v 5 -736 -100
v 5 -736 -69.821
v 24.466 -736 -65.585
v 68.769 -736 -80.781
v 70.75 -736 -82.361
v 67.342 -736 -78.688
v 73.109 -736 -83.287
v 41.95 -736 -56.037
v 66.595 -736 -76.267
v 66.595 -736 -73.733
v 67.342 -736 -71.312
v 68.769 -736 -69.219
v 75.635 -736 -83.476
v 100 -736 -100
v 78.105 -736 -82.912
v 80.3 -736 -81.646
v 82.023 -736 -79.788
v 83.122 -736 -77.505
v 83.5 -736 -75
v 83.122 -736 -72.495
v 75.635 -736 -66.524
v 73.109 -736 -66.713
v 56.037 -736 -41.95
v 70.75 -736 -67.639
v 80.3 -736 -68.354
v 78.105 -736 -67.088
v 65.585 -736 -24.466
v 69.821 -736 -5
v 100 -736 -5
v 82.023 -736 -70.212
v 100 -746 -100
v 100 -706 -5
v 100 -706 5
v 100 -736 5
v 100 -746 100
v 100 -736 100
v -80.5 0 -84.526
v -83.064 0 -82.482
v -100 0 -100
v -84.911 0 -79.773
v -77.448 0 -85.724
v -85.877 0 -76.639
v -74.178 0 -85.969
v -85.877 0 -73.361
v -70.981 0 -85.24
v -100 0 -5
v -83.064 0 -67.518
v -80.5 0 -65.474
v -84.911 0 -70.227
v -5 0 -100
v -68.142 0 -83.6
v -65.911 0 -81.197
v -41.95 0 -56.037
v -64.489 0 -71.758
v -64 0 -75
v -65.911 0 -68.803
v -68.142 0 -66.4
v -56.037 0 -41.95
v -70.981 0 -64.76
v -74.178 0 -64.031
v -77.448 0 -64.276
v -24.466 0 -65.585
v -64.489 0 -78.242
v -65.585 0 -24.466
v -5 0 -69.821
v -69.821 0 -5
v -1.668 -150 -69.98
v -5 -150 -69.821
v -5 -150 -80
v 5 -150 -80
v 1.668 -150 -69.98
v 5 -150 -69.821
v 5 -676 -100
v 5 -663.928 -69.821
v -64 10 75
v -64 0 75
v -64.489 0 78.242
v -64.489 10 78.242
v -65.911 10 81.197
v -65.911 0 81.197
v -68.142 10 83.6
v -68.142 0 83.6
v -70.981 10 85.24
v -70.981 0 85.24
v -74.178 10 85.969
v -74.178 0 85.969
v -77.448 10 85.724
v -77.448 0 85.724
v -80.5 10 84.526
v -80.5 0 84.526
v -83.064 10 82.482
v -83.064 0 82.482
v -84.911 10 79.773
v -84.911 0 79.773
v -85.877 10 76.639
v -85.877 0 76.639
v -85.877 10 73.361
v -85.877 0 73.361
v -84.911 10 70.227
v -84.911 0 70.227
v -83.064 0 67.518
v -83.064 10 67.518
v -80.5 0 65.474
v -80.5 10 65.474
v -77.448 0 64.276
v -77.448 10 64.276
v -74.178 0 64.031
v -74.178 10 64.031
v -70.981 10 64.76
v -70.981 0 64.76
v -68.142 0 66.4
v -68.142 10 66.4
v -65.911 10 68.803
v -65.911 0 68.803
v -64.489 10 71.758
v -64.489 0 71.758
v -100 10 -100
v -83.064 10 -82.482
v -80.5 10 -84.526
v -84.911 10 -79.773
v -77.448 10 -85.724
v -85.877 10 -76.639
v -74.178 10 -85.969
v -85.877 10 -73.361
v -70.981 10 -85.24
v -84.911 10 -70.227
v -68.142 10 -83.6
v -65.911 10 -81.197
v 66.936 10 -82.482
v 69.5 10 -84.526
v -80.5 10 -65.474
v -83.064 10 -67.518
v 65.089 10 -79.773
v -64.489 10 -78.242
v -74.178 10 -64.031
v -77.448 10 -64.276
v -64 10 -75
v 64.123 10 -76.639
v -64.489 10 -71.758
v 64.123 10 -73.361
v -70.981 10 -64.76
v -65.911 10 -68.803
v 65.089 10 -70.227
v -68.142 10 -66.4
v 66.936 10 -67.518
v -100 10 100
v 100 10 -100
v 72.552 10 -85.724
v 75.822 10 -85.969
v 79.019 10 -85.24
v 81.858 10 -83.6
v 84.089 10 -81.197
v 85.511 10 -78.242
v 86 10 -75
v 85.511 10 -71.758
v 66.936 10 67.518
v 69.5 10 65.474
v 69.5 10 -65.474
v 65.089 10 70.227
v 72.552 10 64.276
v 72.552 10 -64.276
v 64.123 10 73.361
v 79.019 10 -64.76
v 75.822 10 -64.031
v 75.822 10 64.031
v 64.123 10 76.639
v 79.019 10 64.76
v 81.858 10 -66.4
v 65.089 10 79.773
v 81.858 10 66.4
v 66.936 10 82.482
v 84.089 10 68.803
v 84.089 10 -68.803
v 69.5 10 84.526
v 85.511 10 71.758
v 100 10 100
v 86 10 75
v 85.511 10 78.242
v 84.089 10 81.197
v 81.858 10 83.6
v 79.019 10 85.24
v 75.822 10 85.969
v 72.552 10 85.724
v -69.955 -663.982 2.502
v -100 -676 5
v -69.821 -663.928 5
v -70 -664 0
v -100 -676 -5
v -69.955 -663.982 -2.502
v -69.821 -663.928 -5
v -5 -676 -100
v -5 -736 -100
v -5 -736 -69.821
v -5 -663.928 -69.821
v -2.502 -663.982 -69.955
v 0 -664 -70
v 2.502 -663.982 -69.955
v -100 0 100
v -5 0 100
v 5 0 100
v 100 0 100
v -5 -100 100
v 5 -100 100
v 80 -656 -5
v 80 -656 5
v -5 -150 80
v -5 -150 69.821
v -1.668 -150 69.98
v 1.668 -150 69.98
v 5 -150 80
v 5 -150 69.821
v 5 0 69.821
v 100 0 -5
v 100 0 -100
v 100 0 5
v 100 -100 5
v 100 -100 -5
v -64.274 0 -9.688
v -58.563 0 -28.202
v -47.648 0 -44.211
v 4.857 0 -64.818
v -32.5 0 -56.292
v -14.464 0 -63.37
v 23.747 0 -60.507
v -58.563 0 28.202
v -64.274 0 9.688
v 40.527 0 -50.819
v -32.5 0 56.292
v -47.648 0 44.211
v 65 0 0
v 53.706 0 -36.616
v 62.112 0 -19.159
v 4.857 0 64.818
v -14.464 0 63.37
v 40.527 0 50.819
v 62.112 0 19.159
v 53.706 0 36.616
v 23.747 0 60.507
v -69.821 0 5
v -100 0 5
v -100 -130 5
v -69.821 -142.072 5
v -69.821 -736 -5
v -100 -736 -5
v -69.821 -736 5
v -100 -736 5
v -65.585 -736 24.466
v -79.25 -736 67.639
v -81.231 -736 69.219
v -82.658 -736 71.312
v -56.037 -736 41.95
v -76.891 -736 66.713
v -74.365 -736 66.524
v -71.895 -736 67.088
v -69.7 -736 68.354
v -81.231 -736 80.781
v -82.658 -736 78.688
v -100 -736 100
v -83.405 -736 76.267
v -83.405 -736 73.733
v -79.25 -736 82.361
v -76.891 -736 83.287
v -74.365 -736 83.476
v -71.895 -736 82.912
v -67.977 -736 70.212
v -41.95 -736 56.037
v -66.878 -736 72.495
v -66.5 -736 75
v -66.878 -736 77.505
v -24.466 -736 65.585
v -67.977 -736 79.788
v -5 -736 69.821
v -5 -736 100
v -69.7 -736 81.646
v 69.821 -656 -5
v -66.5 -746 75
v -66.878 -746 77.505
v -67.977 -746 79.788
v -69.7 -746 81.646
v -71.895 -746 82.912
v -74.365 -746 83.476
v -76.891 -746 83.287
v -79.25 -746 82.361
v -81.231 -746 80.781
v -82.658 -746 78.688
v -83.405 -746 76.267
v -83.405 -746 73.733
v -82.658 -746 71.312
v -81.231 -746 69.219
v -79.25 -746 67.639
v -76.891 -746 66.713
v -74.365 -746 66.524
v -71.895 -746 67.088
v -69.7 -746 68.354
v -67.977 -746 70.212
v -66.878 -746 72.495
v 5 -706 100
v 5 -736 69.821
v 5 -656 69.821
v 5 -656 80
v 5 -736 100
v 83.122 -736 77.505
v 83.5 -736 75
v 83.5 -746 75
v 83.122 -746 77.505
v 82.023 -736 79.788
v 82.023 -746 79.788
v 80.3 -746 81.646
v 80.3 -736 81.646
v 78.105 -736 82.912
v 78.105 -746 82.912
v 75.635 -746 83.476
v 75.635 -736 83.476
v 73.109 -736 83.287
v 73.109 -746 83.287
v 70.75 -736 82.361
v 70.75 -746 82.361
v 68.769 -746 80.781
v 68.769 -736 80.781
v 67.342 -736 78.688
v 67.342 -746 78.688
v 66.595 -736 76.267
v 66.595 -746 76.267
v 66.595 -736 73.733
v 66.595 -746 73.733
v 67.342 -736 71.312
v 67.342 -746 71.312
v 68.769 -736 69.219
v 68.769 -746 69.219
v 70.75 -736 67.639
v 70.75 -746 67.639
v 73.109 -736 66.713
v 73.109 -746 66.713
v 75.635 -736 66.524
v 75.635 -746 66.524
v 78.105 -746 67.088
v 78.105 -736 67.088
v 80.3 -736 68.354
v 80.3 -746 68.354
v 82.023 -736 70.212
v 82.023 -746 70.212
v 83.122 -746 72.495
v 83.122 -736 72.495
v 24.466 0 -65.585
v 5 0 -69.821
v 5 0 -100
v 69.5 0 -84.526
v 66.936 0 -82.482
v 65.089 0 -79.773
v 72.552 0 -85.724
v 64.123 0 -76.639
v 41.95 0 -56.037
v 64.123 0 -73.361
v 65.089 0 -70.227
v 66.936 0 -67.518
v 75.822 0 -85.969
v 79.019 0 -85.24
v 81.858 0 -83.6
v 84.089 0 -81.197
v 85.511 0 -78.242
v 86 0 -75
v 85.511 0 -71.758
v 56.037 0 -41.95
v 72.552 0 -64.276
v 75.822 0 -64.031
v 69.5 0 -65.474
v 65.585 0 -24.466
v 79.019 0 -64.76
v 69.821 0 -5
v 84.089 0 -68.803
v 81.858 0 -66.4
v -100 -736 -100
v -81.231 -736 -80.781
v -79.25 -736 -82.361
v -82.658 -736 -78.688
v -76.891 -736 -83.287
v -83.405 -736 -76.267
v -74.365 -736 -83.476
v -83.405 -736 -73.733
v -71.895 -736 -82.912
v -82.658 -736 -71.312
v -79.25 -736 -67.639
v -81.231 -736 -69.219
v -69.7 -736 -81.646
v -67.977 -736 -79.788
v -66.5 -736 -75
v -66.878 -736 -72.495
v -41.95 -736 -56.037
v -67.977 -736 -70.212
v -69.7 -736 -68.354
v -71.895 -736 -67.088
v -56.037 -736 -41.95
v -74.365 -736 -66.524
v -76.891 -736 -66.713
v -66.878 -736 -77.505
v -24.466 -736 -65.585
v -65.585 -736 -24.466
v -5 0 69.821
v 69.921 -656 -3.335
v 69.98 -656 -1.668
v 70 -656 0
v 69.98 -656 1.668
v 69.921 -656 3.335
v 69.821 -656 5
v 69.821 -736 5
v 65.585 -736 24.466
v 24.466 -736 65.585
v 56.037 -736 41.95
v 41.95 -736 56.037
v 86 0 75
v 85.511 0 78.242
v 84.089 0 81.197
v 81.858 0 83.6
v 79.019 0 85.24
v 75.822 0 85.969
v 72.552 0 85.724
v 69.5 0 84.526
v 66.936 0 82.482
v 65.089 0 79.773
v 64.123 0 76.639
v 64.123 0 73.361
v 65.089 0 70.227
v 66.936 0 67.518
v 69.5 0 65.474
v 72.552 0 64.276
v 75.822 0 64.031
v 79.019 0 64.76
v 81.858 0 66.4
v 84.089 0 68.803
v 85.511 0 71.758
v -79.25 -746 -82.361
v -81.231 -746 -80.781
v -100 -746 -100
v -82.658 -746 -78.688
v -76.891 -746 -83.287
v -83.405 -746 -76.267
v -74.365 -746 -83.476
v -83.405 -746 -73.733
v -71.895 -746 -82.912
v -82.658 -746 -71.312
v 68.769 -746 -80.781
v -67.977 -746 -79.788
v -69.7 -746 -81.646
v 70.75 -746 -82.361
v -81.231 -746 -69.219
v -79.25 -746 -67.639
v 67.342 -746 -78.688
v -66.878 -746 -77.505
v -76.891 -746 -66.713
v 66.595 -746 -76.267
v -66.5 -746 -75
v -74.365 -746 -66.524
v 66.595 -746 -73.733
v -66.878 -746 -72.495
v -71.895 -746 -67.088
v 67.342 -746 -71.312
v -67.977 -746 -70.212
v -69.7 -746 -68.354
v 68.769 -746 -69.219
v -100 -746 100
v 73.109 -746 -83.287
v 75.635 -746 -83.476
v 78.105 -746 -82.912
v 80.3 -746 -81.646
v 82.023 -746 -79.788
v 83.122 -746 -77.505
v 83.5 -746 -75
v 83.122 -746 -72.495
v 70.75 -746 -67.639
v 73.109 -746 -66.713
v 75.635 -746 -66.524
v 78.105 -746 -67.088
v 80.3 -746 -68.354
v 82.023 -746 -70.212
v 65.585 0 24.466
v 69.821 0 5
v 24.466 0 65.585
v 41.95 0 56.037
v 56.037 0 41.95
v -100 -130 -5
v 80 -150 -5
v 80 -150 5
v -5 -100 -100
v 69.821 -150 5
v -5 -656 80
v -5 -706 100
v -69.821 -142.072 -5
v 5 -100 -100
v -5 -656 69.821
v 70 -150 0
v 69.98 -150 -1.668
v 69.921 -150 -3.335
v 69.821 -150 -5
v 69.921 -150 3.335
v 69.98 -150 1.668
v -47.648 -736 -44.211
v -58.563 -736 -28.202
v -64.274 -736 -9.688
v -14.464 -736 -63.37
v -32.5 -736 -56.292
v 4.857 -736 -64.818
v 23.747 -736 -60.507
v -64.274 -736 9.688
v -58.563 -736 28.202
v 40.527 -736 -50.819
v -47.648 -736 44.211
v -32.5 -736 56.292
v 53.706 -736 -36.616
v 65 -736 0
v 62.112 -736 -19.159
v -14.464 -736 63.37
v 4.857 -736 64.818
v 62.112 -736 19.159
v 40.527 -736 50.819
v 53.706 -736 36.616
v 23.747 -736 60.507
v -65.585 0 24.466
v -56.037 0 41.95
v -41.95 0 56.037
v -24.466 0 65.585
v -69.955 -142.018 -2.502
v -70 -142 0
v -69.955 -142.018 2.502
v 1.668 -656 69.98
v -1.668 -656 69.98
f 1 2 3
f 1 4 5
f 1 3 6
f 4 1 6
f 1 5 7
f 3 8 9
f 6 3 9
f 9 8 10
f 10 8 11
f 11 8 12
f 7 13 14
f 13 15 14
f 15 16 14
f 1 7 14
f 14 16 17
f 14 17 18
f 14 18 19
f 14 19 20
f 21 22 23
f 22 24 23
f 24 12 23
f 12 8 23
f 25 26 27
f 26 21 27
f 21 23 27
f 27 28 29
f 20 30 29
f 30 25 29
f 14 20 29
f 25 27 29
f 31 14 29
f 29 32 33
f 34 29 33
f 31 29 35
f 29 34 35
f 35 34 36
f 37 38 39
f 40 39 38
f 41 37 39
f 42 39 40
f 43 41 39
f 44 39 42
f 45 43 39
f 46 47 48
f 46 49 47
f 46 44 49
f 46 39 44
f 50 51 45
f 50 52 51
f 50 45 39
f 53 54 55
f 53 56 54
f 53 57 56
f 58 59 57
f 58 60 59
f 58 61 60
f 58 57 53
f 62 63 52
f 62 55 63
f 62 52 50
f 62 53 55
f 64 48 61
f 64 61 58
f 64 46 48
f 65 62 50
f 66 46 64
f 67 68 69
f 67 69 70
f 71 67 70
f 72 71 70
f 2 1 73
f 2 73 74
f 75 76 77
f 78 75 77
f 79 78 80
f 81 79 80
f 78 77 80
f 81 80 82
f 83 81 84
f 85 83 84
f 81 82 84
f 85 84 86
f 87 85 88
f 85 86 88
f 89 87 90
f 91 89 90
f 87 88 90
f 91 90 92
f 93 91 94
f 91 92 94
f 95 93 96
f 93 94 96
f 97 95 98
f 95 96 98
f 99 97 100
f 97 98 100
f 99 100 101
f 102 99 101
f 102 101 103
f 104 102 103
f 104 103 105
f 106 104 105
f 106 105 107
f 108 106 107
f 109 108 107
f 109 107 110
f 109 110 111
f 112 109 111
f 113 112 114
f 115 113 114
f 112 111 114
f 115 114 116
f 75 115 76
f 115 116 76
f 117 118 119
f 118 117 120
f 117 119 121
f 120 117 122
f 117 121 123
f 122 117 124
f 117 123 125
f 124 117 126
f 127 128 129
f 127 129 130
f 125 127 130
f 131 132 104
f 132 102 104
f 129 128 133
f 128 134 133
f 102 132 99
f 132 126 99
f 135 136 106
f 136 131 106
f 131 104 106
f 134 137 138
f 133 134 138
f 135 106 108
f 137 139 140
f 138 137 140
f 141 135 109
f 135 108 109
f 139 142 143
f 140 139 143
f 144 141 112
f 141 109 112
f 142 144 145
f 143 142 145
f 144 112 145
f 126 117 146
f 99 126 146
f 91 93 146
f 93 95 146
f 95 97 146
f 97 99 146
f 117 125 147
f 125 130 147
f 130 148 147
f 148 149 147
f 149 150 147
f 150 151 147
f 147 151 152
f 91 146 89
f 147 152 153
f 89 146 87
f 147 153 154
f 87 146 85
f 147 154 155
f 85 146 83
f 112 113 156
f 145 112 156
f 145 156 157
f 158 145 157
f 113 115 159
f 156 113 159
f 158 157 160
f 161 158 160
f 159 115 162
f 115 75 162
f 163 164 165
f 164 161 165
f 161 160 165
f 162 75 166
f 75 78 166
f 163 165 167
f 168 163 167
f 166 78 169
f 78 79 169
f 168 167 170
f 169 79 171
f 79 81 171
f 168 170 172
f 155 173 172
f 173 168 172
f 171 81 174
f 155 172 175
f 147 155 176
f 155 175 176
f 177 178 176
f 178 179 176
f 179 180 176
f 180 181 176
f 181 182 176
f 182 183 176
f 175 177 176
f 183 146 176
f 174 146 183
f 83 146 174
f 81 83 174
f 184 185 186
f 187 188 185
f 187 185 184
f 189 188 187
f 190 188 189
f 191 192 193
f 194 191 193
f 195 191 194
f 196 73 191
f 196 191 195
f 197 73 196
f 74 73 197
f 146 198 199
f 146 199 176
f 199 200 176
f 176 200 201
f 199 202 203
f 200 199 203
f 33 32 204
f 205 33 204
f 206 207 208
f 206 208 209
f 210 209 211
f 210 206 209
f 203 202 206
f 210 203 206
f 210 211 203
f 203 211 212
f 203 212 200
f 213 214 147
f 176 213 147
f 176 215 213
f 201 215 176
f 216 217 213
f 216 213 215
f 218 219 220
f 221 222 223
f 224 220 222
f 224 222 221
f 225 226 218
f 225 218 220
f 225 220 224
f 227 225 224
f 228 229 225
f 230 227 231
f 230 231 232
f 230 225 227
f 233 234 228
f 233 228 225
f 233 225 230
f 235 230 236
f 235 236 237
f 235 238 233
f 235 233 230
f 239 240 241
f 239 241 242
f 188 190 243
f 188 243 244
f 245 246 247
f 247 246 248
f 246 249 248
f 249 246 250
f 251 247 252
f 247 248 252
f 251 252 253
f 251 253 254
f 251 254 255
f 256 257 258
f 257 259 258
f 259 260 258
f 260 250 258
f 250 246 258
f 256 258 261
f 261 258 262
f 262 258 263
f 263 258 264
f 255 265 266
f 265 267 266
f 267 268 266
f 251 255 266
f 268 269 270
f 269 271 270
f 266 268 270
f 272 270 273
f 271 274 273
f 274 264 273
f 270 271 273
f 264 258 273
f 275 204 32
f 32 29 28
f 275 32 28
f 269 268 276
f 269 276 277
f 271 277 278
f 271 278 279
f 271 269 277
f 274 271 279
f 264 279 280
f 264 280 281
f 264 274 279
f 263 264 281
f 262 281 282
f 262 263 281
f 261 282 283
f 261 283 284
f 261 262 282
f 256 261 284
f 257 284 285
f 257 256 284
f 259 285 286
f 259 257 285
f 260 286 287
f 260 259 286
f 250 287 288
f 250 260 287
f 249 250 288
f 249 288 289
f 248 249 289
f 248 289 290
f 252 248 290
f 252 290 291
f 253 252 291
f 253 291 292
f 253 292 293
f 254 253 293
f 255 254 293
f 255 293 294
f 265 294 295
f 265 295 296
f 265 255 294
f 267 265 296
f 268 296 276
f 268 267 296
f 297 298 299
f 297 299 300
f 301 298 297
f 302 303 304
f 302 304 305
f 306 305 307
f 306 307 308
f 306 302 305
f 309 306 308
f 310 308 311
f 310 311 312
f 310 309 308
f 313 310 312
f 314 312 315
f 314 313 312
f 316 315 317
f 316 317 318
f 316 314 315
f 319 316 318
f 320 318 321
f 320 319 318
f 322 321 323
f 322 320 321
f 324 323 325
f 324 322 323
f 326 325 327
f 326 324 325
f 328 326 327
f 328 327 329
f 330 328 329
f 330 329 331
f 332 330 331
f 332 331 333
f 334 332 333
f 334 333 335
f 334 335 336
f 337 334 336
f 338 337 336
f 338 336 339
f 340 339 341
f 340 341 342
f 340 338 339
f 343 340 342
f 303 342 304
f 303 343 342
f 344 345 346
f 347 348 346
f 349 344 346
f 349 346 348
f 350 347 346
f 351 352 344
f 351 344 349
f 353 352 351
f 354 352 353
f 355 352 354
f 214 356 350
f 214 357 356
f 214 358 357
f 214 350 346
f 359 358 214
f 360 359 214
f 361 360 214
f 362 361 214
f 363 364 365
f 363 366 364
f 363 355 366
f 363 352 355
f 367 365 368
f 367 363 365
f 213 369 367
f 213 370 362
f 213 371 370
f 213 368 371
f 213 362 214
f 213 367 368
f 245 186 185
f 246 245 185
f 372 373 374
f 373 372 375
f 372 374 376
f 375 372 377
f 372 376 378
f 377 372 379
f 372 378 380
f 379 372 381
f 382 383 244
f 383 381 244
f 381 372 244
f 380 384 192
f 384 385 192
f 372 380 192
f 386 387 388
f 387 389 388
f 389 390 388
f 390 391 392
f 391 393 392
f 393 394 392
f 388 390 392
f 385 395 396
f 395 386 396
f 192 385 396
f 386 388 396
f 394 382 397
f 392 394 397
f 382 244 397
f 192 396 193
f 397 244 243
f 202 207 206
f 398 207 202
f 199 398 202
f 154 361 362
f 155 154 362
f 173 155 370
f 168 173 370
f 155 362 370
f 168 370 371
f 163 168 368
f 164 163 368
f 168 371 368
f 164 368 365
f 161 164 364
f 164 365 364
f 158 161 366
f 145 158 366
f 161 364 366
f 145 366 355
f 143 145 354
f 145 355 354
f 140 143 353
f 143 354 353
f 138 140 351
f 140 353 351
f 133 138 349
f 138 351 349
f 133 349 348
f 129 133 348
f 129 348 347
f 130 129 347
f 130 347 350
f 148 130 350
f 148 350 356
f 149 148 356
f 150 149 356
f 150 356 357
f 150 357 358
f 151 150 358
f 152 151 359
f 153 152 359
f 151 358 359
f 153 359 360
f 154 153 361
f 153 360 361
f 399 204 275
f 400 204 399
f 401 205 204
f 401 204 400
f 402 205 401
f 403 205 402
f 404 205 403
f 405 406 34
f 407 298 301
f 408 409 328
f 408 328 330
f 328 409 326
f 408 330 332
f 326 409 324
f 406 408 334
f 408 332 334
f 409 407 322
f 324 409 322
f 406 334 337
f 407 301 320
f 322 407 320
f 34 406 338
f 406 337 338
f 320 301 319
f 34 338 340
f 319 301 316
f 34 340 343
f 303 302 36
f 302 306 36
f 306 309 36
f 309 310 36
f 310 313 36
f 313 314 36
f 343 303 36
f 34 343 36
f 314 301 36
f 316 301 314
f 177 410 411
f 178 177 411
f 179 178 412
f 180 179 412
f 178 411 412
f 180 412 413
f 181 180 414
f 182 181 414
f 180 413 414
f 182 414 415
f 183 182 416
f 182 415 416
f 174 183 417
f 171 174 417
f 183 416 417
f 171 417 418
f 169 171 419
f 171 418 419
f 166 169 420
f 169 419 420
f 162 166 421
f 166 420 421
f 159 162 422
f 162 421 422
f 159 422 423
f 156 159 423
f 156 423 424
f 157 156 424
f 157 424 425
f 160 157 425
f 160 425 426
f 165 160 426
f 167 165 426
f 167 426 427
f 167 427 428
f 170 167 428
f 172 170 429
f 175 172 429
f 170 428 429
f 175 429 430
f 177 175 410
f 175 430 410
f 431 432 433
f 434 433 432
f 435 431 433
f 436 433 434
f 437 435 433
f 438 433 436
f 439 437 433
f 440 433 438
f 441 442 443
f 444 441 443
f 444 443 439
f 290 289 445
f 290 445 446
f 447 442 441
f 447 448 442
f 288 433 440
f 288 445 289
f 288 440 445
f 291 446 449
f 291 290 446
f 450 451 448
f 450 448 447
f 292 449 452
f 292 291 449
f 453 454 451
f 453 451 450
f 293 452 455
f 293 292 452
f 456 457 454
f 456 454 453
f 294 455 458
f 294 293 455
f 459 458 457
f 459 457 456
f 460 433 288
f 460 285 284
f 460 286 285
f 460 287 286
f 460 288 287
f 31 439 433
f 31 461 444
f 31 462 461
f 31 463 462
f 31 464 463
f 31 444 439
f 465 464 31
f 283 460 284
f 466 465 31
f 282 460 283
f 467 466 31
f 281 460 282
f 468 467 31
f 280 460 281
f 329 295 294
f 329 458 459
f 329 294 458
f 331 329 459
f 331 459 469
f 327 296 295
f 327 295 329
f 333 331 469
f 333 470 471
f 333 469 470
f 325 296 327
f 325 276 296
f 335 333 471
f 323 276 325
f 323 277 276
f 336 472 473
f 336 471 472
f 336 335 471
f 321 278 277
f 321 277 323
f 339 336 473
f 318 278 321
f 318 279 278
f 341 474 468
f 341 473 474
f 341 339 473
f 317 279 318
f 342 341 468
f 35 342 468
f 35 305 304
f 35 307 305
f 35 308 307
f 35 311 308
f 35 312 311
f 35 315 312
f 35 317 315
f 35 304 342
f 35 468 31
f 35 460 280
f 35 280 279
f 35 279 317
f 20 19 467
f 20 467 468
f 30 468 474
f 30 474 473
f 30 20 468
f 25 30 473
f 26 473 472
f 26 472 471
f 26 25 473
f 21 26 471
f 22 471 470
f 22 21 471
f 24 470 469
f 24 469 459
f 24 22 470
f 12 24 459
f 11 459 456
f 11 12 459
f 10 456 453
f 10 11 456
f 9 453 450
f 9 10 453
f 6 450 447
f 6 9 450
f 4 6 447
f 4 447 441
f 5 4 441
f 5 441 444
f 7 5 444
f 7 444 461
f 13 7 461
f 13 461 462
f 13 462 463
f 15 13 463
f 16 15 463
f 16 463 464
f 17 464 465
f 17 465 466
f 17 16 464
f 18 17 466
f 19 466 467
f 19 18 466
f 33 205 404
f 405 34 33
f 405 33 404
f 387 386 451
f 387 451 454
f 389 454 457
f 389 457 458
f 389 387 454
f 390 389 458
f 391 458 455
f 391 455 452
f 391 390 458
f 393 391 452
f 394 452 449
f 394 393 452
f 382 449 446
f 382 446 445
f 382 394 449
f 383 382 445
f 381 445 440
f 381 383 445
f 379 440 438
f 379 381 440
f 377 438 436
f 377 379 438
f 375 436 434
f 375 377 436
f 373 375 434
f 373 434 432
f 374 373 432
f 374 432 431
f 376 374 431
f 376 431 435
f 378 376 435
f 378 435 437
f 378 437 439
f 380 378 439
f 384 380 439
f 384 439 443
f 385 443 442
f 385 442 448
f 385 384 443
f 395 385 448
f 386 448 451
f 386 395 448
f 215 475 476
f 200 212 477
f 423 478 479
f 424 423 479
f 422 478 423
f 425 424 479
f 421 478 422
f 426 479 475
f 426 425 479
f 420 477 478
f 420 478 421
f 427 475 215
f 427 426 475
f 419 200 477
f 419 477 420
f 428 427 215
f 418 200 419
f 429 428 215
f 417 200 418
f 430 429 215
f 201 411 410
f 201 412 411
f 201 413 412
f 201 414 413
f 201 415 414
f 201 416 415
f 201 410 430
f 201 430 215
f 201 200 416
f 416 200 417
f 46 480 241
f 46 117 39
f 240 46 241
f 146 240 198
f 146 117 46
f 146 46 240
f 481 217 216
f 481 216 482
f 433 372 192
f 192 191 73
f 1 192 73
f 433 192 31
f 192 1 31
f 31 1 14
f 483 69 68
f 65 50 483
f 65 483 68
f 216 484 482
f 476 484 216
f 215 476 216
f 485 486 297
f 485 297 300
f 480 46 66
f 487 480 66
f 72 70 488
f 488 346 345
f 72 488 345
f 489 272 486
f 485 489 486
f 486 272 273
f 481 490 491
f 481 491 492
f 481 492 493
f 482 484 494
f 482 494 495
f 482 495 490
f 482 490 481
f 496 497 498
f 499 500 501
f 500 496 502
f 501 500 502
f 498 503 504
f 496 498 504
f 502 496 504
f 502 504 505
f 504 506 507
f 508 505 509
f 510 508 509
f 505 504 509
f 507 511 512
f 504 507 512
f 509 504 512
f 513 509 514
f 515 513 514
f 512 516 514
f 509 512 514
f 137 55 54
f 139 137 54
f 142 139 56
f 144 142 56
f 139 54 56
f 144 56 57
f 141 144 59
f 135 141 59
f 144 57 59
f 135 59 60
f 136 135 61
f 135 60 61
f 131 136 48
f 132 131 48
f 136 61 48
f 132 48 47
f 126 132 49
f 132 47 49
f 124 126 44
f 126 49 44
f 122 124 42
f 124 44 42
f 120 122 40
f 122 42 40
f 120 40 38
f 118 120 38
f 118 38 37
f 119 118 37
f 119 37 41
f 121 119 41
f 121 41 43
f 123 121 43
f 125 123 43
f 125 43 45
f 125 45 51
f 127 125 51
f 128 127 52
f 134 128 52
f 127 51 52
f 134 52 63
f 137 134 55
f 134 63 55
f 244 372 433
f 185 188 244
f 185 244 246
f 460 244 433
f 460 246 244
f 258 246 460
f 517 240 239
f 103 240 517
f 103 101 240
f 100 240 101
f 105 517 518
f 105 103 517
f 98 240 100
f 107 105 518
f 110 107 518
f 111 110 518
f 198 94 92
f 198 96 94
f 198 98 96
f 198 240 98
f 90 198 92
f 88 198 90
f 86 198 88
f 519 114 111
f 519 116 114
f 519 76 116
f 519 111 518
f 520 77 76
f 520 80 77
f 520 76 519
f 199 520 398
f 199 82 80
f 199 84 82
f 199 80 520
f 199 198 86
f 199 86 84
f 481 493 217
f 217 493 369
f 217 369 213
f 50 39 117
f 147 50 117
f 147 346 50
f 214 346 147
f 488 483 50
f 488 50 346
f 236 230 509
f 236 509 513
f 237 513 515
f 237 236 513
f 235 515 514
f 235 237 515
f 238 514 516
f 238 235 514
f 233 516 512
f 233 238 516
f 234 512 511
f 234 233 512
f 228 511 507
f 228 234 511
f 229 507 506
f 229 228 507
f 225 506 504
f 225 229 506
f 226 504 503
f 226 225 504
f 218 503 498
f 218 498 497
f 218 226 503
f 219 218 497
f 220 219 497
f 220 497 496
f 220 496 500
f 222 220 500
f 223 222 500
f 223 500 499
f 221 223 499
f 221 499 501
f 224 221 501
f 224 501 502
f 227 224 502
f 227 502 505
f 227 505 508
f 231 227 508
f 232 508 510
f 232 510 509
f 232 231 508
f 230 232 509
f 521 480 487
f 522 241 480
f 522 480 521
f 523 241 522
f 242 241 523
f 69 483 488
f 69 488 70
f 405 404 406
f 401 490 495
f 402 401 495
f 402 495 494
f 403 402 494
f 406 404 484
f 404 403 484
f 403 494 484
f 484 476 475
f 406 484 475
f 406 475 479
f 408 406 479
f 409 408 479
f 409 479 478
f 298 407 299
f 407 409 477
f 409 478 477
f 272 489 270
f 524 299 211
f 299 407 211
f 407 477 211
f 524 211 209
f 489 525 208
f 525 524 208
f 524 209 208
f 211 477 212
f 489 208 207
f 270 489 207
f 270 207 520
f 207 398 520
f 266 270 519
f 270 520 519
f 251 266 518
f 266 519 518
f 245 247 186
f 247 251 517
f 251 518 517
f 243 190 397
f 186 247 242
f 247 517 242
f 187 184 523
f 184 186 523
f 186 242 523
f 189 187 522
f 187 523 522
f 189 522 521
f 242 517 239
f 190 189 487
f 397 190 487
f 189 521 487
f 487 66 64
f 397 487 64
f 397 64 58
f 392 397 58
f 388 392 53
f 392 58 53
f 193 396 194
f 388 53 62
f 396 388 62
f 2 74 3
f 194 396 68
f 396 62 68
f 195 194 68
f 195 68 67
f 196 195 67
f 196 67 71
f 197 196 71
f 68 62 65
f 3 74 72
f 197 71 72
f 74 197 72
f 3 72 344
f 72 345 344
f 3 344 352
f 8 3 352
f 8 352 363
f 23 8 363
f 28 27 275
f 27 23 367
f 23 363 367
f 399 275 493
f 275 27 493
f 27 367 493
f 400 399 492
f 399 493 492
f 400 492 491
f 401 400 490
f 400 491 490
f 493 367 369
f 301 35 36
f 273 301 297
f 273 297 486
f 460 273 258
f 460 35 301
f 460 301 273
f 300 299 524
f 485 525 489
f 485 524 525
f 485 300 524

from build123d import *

# Parameters (mm, degrees)
F0_R          = 70
F0_R_2        = 65
F1_DEPTH      = 736
F2_W          = 200
F2_H          = 200
F2_R          = 11
F3_DEPTH      = 10
F4_W          = 30.1787997812
F4_H          = 10
F4_W_2        = 10
F4_H_2        = 30.1787997812
F5_DEPTH      = 150
F6_T1_DEPTH   = 269.311363913
F6_T3_DEPTH   = 269.311363913
F6_T8_DEPTH   = 269.311363913
F6_S9_R       = 70
F6_T10_DEPTH  = 139
F8_W          = 200
F8_H          = 200
F8_R          = 8.5
F9_DEPTH      = 10
F10_W         = 10
F10_H         = 30.1787997812
F10_W_2       = 30.1787997812
F10_H_2       = 10
F11_DEPTH     = 80
F12_T1_DEPTH  = 269.311363913
F12_T3_DEPTH  = 269.311363913
F12_T8_DEPTH  = 269.311363913
F12_S9_R      = 70
F12_T10_DEPTH = 139
F12_T14_DEPTH = 269.311363913
F12_S15_R     = 70
F12_T16_DEPTH = 139


# Not quite as in the source:
# - a fillet or chamfer that OpenCascade refuses, or shapes differently, is made with other operations: its cross-section is extruded or revolved along the edge and cut away or added


with BuildPart() as f1:
    # F0 (on Front) → F1 (new body)
    with BuildSketch(Plane.XZ):
        Circle(F0_R)
        Circle(F0_R_2, mode=Mode.SUBTRACT)
    extrude(amount=F1_DEPTH)

    # F2 (on Front) → F3 (join)
    with BuildSketch(Plane.XZ):
        Rectangle(F2_W, F2_H)
        with Locations((-75, -75)):
            Circle(F2_R, mode=Mode.SUBTRACT)
        with Locations((75, -75)):
            Circle(F2_R, mode=Mode.SUBTRACT)
        with Locations((-75, 75)):
            Circle(F2_R, mode=Mode.SUBTRACT)
        with Locations((75, 75)):
            Circle(F2_R, mode=Mode.SUBTRACT)
    extrude(amount=-F3_DEPTH)

    # F4 (on Front) → F5 (join)
    with BuildSketch(Plane.XZ):
        with Locations((-84.9106001094, 0)):
            Rectangle(F4_W, F4_H)
        with Locations((0, 84.9106001094)):
            Rectangle(F4_W_2, F4_H_2)
        with Locations((84.9106001094, 0)):
            Rectangle(F4_W, F4_H)
        with Locations((0, -84.9106001094)):
            Rectangle(F4_W_2, F4_H_2)
    extrude(amount=F5_DEPTH)

    # F6: chamfer of 50 x 20 on 4 edges, made by hand

    # F6_s2 → F6_t1 (cut)
    with BuildSketch(Plane.YZ.offset(-134.6556819565)):
        Polygon((-100, 100), (-150, 80), (-150, 100), align=None)
        Polygon((-100, -100), (-150, -80), (-150, -100), align=None)
    extrude(amount=F6_T1_DEPTH, mode=Mode.SUBTRACT)

    # F6_s4 → F6_t3 (cut)
    with BuildSketch(Plane.XY.offset(-134.6556819565)):
        Polygon((100, -100), (80, -150), (100, -150), align=None)
    extrude(amount=F6_T3_DEPTH, mode=Mode.SUBTRACT)


with BuildPart() as f6_tool6:
    # F6_s7 → F6_t8 (new body)
    with BuildSketch(Plane.XY.offset(134.6556819565)):
        Polygon((-100, -130), (-50, -150), (-100, -150), align=None)
    extrude(amount=-F6_T8_DEPTH)

    # F6_s9 → F6_t10 (cut, symmetric)
    with BuildSketch(Plane.XZ.offset(140)):
        Circle(F6_S9_R)
    extrude(amount=F6_T10_DEPTH, both=True, mode=Mode.SUBTRACT)


with BuildPart() as f1_1:
    add(f1.part)

    # F6_t5: cut F6_tool6
    add(f6_tool6.part, mode=Mode.SUBTRACT)

    # F8 (on offset) → F9 (join)
    with BuildSketch(Plane.XZ.offset(736)):
        Rectangle(F8_W, F8_H)
        with Locations((-75, -75)):
            Circle(F8_R, mode=Mode.SUBTRACT)
        with Locations((75, -75)):
            Circle(F8_R, mode=Mode.SUBTRACT)
        with Locations((-75, 75)):
            Circle(F8_R, mode=Mode.SUBTRACT)
        with Locations((75, 75)):
            Circle(F8_R, mode=Mode.SUBTRACT)
    extrude(amount=F9_DEPTH)

    # F10 (on face) → F11 (join)
    with BuildSketch(Plane(origin=(0, -736, 0), x_dir=(-1, 0, 0), z_dir=(0, 1, 0))):
        with Locations((0, 84.9106001094)):
            Rectangle(F10_W, F10_H)
        with Locations((84.9106001094, 0)):
            Rectangle(F10_W_2, F10_H_2)
        with Locations((0, -84.9106001094)):
            Rectangle(F10_W, F10_H)
        with Locations((-84.9106001094, 0)):
            Rectangle(F10_W_2, F10_H_2)
    extrude(amount=F11_DEPTH)

    # F12: chamfer of 20 x 50 on 4 edges, made by hand

    # F12_s2 → F12_t1 (cut)
    with BuildSketch(Plane.YZ.offset(-134.6556819565)):
        Polygon((-706, 100), (-656, 80), (-656, 100), align=None)
    extrude(amount=F12_T1_DEPTH, mode=Mode.SUBTRACT)

    # F12_s4 → F12_t3 (cut)
    with BuildSketch(Plane.XY.offset(-134.6556819565)):
        Polygon((100, -706), (80, -656), (100, -656), align=None)
    extrude(amount=F12_T3_DEPTH, mode=Mode.SUBTRACT)


with BuildPart() as f12_tool6:
    # F12_s7 → F12_t8 (new body)
    with BuildSketch(Plane.XY.offset(-134.6556819565)):
        Polygon((-100, -676), (-50, -656), (-100, -656), align=None)
    extrude(amount=F12_T8_DEPTH)

    # F12_s9 → F12_t10 (cut, symmetric)
    with BuildSketch(Plane.XZ.offset(666)):
        Circle(F12_S9_R)
    extrude(amount=F12_T10_DEPTH, both=True, mode=Mode.SUBTRACT)


with BuildPart() as f1_2:
    add(f1_1.part)

    # F12_t5: cut F12_tool6
    add(f12_tool6.part, mode=Mode.SUBTRACT)


with BuildPart() as f12_tool12:
    # F12_s13 → F12_t14 (new body)
    with BuildSketch(Plane.YZ.offset(134.6556819565)):
        Polygon((-676, -100), (-656, -50), (-656, -100), align=None)
    extrude(amount=-F12_T14_DEPTH)

    # F12_s15 → F12_t16 (cut, symmetric)
    with BuildSketch(Plane.XZ.offset(666)):
        Circle(F12_S15_R)
    extrude(amount=F12_T16_DEPTH, both=True, mode=Mode.SUBTRACT)


with BuildPart() as f1_3:
    add(f1_2.part)

    # F12_t11: cut F12_tool12
    add(f12_tool12.part, mode=Mode.SUBTRACT)


solid = f1_3.part
